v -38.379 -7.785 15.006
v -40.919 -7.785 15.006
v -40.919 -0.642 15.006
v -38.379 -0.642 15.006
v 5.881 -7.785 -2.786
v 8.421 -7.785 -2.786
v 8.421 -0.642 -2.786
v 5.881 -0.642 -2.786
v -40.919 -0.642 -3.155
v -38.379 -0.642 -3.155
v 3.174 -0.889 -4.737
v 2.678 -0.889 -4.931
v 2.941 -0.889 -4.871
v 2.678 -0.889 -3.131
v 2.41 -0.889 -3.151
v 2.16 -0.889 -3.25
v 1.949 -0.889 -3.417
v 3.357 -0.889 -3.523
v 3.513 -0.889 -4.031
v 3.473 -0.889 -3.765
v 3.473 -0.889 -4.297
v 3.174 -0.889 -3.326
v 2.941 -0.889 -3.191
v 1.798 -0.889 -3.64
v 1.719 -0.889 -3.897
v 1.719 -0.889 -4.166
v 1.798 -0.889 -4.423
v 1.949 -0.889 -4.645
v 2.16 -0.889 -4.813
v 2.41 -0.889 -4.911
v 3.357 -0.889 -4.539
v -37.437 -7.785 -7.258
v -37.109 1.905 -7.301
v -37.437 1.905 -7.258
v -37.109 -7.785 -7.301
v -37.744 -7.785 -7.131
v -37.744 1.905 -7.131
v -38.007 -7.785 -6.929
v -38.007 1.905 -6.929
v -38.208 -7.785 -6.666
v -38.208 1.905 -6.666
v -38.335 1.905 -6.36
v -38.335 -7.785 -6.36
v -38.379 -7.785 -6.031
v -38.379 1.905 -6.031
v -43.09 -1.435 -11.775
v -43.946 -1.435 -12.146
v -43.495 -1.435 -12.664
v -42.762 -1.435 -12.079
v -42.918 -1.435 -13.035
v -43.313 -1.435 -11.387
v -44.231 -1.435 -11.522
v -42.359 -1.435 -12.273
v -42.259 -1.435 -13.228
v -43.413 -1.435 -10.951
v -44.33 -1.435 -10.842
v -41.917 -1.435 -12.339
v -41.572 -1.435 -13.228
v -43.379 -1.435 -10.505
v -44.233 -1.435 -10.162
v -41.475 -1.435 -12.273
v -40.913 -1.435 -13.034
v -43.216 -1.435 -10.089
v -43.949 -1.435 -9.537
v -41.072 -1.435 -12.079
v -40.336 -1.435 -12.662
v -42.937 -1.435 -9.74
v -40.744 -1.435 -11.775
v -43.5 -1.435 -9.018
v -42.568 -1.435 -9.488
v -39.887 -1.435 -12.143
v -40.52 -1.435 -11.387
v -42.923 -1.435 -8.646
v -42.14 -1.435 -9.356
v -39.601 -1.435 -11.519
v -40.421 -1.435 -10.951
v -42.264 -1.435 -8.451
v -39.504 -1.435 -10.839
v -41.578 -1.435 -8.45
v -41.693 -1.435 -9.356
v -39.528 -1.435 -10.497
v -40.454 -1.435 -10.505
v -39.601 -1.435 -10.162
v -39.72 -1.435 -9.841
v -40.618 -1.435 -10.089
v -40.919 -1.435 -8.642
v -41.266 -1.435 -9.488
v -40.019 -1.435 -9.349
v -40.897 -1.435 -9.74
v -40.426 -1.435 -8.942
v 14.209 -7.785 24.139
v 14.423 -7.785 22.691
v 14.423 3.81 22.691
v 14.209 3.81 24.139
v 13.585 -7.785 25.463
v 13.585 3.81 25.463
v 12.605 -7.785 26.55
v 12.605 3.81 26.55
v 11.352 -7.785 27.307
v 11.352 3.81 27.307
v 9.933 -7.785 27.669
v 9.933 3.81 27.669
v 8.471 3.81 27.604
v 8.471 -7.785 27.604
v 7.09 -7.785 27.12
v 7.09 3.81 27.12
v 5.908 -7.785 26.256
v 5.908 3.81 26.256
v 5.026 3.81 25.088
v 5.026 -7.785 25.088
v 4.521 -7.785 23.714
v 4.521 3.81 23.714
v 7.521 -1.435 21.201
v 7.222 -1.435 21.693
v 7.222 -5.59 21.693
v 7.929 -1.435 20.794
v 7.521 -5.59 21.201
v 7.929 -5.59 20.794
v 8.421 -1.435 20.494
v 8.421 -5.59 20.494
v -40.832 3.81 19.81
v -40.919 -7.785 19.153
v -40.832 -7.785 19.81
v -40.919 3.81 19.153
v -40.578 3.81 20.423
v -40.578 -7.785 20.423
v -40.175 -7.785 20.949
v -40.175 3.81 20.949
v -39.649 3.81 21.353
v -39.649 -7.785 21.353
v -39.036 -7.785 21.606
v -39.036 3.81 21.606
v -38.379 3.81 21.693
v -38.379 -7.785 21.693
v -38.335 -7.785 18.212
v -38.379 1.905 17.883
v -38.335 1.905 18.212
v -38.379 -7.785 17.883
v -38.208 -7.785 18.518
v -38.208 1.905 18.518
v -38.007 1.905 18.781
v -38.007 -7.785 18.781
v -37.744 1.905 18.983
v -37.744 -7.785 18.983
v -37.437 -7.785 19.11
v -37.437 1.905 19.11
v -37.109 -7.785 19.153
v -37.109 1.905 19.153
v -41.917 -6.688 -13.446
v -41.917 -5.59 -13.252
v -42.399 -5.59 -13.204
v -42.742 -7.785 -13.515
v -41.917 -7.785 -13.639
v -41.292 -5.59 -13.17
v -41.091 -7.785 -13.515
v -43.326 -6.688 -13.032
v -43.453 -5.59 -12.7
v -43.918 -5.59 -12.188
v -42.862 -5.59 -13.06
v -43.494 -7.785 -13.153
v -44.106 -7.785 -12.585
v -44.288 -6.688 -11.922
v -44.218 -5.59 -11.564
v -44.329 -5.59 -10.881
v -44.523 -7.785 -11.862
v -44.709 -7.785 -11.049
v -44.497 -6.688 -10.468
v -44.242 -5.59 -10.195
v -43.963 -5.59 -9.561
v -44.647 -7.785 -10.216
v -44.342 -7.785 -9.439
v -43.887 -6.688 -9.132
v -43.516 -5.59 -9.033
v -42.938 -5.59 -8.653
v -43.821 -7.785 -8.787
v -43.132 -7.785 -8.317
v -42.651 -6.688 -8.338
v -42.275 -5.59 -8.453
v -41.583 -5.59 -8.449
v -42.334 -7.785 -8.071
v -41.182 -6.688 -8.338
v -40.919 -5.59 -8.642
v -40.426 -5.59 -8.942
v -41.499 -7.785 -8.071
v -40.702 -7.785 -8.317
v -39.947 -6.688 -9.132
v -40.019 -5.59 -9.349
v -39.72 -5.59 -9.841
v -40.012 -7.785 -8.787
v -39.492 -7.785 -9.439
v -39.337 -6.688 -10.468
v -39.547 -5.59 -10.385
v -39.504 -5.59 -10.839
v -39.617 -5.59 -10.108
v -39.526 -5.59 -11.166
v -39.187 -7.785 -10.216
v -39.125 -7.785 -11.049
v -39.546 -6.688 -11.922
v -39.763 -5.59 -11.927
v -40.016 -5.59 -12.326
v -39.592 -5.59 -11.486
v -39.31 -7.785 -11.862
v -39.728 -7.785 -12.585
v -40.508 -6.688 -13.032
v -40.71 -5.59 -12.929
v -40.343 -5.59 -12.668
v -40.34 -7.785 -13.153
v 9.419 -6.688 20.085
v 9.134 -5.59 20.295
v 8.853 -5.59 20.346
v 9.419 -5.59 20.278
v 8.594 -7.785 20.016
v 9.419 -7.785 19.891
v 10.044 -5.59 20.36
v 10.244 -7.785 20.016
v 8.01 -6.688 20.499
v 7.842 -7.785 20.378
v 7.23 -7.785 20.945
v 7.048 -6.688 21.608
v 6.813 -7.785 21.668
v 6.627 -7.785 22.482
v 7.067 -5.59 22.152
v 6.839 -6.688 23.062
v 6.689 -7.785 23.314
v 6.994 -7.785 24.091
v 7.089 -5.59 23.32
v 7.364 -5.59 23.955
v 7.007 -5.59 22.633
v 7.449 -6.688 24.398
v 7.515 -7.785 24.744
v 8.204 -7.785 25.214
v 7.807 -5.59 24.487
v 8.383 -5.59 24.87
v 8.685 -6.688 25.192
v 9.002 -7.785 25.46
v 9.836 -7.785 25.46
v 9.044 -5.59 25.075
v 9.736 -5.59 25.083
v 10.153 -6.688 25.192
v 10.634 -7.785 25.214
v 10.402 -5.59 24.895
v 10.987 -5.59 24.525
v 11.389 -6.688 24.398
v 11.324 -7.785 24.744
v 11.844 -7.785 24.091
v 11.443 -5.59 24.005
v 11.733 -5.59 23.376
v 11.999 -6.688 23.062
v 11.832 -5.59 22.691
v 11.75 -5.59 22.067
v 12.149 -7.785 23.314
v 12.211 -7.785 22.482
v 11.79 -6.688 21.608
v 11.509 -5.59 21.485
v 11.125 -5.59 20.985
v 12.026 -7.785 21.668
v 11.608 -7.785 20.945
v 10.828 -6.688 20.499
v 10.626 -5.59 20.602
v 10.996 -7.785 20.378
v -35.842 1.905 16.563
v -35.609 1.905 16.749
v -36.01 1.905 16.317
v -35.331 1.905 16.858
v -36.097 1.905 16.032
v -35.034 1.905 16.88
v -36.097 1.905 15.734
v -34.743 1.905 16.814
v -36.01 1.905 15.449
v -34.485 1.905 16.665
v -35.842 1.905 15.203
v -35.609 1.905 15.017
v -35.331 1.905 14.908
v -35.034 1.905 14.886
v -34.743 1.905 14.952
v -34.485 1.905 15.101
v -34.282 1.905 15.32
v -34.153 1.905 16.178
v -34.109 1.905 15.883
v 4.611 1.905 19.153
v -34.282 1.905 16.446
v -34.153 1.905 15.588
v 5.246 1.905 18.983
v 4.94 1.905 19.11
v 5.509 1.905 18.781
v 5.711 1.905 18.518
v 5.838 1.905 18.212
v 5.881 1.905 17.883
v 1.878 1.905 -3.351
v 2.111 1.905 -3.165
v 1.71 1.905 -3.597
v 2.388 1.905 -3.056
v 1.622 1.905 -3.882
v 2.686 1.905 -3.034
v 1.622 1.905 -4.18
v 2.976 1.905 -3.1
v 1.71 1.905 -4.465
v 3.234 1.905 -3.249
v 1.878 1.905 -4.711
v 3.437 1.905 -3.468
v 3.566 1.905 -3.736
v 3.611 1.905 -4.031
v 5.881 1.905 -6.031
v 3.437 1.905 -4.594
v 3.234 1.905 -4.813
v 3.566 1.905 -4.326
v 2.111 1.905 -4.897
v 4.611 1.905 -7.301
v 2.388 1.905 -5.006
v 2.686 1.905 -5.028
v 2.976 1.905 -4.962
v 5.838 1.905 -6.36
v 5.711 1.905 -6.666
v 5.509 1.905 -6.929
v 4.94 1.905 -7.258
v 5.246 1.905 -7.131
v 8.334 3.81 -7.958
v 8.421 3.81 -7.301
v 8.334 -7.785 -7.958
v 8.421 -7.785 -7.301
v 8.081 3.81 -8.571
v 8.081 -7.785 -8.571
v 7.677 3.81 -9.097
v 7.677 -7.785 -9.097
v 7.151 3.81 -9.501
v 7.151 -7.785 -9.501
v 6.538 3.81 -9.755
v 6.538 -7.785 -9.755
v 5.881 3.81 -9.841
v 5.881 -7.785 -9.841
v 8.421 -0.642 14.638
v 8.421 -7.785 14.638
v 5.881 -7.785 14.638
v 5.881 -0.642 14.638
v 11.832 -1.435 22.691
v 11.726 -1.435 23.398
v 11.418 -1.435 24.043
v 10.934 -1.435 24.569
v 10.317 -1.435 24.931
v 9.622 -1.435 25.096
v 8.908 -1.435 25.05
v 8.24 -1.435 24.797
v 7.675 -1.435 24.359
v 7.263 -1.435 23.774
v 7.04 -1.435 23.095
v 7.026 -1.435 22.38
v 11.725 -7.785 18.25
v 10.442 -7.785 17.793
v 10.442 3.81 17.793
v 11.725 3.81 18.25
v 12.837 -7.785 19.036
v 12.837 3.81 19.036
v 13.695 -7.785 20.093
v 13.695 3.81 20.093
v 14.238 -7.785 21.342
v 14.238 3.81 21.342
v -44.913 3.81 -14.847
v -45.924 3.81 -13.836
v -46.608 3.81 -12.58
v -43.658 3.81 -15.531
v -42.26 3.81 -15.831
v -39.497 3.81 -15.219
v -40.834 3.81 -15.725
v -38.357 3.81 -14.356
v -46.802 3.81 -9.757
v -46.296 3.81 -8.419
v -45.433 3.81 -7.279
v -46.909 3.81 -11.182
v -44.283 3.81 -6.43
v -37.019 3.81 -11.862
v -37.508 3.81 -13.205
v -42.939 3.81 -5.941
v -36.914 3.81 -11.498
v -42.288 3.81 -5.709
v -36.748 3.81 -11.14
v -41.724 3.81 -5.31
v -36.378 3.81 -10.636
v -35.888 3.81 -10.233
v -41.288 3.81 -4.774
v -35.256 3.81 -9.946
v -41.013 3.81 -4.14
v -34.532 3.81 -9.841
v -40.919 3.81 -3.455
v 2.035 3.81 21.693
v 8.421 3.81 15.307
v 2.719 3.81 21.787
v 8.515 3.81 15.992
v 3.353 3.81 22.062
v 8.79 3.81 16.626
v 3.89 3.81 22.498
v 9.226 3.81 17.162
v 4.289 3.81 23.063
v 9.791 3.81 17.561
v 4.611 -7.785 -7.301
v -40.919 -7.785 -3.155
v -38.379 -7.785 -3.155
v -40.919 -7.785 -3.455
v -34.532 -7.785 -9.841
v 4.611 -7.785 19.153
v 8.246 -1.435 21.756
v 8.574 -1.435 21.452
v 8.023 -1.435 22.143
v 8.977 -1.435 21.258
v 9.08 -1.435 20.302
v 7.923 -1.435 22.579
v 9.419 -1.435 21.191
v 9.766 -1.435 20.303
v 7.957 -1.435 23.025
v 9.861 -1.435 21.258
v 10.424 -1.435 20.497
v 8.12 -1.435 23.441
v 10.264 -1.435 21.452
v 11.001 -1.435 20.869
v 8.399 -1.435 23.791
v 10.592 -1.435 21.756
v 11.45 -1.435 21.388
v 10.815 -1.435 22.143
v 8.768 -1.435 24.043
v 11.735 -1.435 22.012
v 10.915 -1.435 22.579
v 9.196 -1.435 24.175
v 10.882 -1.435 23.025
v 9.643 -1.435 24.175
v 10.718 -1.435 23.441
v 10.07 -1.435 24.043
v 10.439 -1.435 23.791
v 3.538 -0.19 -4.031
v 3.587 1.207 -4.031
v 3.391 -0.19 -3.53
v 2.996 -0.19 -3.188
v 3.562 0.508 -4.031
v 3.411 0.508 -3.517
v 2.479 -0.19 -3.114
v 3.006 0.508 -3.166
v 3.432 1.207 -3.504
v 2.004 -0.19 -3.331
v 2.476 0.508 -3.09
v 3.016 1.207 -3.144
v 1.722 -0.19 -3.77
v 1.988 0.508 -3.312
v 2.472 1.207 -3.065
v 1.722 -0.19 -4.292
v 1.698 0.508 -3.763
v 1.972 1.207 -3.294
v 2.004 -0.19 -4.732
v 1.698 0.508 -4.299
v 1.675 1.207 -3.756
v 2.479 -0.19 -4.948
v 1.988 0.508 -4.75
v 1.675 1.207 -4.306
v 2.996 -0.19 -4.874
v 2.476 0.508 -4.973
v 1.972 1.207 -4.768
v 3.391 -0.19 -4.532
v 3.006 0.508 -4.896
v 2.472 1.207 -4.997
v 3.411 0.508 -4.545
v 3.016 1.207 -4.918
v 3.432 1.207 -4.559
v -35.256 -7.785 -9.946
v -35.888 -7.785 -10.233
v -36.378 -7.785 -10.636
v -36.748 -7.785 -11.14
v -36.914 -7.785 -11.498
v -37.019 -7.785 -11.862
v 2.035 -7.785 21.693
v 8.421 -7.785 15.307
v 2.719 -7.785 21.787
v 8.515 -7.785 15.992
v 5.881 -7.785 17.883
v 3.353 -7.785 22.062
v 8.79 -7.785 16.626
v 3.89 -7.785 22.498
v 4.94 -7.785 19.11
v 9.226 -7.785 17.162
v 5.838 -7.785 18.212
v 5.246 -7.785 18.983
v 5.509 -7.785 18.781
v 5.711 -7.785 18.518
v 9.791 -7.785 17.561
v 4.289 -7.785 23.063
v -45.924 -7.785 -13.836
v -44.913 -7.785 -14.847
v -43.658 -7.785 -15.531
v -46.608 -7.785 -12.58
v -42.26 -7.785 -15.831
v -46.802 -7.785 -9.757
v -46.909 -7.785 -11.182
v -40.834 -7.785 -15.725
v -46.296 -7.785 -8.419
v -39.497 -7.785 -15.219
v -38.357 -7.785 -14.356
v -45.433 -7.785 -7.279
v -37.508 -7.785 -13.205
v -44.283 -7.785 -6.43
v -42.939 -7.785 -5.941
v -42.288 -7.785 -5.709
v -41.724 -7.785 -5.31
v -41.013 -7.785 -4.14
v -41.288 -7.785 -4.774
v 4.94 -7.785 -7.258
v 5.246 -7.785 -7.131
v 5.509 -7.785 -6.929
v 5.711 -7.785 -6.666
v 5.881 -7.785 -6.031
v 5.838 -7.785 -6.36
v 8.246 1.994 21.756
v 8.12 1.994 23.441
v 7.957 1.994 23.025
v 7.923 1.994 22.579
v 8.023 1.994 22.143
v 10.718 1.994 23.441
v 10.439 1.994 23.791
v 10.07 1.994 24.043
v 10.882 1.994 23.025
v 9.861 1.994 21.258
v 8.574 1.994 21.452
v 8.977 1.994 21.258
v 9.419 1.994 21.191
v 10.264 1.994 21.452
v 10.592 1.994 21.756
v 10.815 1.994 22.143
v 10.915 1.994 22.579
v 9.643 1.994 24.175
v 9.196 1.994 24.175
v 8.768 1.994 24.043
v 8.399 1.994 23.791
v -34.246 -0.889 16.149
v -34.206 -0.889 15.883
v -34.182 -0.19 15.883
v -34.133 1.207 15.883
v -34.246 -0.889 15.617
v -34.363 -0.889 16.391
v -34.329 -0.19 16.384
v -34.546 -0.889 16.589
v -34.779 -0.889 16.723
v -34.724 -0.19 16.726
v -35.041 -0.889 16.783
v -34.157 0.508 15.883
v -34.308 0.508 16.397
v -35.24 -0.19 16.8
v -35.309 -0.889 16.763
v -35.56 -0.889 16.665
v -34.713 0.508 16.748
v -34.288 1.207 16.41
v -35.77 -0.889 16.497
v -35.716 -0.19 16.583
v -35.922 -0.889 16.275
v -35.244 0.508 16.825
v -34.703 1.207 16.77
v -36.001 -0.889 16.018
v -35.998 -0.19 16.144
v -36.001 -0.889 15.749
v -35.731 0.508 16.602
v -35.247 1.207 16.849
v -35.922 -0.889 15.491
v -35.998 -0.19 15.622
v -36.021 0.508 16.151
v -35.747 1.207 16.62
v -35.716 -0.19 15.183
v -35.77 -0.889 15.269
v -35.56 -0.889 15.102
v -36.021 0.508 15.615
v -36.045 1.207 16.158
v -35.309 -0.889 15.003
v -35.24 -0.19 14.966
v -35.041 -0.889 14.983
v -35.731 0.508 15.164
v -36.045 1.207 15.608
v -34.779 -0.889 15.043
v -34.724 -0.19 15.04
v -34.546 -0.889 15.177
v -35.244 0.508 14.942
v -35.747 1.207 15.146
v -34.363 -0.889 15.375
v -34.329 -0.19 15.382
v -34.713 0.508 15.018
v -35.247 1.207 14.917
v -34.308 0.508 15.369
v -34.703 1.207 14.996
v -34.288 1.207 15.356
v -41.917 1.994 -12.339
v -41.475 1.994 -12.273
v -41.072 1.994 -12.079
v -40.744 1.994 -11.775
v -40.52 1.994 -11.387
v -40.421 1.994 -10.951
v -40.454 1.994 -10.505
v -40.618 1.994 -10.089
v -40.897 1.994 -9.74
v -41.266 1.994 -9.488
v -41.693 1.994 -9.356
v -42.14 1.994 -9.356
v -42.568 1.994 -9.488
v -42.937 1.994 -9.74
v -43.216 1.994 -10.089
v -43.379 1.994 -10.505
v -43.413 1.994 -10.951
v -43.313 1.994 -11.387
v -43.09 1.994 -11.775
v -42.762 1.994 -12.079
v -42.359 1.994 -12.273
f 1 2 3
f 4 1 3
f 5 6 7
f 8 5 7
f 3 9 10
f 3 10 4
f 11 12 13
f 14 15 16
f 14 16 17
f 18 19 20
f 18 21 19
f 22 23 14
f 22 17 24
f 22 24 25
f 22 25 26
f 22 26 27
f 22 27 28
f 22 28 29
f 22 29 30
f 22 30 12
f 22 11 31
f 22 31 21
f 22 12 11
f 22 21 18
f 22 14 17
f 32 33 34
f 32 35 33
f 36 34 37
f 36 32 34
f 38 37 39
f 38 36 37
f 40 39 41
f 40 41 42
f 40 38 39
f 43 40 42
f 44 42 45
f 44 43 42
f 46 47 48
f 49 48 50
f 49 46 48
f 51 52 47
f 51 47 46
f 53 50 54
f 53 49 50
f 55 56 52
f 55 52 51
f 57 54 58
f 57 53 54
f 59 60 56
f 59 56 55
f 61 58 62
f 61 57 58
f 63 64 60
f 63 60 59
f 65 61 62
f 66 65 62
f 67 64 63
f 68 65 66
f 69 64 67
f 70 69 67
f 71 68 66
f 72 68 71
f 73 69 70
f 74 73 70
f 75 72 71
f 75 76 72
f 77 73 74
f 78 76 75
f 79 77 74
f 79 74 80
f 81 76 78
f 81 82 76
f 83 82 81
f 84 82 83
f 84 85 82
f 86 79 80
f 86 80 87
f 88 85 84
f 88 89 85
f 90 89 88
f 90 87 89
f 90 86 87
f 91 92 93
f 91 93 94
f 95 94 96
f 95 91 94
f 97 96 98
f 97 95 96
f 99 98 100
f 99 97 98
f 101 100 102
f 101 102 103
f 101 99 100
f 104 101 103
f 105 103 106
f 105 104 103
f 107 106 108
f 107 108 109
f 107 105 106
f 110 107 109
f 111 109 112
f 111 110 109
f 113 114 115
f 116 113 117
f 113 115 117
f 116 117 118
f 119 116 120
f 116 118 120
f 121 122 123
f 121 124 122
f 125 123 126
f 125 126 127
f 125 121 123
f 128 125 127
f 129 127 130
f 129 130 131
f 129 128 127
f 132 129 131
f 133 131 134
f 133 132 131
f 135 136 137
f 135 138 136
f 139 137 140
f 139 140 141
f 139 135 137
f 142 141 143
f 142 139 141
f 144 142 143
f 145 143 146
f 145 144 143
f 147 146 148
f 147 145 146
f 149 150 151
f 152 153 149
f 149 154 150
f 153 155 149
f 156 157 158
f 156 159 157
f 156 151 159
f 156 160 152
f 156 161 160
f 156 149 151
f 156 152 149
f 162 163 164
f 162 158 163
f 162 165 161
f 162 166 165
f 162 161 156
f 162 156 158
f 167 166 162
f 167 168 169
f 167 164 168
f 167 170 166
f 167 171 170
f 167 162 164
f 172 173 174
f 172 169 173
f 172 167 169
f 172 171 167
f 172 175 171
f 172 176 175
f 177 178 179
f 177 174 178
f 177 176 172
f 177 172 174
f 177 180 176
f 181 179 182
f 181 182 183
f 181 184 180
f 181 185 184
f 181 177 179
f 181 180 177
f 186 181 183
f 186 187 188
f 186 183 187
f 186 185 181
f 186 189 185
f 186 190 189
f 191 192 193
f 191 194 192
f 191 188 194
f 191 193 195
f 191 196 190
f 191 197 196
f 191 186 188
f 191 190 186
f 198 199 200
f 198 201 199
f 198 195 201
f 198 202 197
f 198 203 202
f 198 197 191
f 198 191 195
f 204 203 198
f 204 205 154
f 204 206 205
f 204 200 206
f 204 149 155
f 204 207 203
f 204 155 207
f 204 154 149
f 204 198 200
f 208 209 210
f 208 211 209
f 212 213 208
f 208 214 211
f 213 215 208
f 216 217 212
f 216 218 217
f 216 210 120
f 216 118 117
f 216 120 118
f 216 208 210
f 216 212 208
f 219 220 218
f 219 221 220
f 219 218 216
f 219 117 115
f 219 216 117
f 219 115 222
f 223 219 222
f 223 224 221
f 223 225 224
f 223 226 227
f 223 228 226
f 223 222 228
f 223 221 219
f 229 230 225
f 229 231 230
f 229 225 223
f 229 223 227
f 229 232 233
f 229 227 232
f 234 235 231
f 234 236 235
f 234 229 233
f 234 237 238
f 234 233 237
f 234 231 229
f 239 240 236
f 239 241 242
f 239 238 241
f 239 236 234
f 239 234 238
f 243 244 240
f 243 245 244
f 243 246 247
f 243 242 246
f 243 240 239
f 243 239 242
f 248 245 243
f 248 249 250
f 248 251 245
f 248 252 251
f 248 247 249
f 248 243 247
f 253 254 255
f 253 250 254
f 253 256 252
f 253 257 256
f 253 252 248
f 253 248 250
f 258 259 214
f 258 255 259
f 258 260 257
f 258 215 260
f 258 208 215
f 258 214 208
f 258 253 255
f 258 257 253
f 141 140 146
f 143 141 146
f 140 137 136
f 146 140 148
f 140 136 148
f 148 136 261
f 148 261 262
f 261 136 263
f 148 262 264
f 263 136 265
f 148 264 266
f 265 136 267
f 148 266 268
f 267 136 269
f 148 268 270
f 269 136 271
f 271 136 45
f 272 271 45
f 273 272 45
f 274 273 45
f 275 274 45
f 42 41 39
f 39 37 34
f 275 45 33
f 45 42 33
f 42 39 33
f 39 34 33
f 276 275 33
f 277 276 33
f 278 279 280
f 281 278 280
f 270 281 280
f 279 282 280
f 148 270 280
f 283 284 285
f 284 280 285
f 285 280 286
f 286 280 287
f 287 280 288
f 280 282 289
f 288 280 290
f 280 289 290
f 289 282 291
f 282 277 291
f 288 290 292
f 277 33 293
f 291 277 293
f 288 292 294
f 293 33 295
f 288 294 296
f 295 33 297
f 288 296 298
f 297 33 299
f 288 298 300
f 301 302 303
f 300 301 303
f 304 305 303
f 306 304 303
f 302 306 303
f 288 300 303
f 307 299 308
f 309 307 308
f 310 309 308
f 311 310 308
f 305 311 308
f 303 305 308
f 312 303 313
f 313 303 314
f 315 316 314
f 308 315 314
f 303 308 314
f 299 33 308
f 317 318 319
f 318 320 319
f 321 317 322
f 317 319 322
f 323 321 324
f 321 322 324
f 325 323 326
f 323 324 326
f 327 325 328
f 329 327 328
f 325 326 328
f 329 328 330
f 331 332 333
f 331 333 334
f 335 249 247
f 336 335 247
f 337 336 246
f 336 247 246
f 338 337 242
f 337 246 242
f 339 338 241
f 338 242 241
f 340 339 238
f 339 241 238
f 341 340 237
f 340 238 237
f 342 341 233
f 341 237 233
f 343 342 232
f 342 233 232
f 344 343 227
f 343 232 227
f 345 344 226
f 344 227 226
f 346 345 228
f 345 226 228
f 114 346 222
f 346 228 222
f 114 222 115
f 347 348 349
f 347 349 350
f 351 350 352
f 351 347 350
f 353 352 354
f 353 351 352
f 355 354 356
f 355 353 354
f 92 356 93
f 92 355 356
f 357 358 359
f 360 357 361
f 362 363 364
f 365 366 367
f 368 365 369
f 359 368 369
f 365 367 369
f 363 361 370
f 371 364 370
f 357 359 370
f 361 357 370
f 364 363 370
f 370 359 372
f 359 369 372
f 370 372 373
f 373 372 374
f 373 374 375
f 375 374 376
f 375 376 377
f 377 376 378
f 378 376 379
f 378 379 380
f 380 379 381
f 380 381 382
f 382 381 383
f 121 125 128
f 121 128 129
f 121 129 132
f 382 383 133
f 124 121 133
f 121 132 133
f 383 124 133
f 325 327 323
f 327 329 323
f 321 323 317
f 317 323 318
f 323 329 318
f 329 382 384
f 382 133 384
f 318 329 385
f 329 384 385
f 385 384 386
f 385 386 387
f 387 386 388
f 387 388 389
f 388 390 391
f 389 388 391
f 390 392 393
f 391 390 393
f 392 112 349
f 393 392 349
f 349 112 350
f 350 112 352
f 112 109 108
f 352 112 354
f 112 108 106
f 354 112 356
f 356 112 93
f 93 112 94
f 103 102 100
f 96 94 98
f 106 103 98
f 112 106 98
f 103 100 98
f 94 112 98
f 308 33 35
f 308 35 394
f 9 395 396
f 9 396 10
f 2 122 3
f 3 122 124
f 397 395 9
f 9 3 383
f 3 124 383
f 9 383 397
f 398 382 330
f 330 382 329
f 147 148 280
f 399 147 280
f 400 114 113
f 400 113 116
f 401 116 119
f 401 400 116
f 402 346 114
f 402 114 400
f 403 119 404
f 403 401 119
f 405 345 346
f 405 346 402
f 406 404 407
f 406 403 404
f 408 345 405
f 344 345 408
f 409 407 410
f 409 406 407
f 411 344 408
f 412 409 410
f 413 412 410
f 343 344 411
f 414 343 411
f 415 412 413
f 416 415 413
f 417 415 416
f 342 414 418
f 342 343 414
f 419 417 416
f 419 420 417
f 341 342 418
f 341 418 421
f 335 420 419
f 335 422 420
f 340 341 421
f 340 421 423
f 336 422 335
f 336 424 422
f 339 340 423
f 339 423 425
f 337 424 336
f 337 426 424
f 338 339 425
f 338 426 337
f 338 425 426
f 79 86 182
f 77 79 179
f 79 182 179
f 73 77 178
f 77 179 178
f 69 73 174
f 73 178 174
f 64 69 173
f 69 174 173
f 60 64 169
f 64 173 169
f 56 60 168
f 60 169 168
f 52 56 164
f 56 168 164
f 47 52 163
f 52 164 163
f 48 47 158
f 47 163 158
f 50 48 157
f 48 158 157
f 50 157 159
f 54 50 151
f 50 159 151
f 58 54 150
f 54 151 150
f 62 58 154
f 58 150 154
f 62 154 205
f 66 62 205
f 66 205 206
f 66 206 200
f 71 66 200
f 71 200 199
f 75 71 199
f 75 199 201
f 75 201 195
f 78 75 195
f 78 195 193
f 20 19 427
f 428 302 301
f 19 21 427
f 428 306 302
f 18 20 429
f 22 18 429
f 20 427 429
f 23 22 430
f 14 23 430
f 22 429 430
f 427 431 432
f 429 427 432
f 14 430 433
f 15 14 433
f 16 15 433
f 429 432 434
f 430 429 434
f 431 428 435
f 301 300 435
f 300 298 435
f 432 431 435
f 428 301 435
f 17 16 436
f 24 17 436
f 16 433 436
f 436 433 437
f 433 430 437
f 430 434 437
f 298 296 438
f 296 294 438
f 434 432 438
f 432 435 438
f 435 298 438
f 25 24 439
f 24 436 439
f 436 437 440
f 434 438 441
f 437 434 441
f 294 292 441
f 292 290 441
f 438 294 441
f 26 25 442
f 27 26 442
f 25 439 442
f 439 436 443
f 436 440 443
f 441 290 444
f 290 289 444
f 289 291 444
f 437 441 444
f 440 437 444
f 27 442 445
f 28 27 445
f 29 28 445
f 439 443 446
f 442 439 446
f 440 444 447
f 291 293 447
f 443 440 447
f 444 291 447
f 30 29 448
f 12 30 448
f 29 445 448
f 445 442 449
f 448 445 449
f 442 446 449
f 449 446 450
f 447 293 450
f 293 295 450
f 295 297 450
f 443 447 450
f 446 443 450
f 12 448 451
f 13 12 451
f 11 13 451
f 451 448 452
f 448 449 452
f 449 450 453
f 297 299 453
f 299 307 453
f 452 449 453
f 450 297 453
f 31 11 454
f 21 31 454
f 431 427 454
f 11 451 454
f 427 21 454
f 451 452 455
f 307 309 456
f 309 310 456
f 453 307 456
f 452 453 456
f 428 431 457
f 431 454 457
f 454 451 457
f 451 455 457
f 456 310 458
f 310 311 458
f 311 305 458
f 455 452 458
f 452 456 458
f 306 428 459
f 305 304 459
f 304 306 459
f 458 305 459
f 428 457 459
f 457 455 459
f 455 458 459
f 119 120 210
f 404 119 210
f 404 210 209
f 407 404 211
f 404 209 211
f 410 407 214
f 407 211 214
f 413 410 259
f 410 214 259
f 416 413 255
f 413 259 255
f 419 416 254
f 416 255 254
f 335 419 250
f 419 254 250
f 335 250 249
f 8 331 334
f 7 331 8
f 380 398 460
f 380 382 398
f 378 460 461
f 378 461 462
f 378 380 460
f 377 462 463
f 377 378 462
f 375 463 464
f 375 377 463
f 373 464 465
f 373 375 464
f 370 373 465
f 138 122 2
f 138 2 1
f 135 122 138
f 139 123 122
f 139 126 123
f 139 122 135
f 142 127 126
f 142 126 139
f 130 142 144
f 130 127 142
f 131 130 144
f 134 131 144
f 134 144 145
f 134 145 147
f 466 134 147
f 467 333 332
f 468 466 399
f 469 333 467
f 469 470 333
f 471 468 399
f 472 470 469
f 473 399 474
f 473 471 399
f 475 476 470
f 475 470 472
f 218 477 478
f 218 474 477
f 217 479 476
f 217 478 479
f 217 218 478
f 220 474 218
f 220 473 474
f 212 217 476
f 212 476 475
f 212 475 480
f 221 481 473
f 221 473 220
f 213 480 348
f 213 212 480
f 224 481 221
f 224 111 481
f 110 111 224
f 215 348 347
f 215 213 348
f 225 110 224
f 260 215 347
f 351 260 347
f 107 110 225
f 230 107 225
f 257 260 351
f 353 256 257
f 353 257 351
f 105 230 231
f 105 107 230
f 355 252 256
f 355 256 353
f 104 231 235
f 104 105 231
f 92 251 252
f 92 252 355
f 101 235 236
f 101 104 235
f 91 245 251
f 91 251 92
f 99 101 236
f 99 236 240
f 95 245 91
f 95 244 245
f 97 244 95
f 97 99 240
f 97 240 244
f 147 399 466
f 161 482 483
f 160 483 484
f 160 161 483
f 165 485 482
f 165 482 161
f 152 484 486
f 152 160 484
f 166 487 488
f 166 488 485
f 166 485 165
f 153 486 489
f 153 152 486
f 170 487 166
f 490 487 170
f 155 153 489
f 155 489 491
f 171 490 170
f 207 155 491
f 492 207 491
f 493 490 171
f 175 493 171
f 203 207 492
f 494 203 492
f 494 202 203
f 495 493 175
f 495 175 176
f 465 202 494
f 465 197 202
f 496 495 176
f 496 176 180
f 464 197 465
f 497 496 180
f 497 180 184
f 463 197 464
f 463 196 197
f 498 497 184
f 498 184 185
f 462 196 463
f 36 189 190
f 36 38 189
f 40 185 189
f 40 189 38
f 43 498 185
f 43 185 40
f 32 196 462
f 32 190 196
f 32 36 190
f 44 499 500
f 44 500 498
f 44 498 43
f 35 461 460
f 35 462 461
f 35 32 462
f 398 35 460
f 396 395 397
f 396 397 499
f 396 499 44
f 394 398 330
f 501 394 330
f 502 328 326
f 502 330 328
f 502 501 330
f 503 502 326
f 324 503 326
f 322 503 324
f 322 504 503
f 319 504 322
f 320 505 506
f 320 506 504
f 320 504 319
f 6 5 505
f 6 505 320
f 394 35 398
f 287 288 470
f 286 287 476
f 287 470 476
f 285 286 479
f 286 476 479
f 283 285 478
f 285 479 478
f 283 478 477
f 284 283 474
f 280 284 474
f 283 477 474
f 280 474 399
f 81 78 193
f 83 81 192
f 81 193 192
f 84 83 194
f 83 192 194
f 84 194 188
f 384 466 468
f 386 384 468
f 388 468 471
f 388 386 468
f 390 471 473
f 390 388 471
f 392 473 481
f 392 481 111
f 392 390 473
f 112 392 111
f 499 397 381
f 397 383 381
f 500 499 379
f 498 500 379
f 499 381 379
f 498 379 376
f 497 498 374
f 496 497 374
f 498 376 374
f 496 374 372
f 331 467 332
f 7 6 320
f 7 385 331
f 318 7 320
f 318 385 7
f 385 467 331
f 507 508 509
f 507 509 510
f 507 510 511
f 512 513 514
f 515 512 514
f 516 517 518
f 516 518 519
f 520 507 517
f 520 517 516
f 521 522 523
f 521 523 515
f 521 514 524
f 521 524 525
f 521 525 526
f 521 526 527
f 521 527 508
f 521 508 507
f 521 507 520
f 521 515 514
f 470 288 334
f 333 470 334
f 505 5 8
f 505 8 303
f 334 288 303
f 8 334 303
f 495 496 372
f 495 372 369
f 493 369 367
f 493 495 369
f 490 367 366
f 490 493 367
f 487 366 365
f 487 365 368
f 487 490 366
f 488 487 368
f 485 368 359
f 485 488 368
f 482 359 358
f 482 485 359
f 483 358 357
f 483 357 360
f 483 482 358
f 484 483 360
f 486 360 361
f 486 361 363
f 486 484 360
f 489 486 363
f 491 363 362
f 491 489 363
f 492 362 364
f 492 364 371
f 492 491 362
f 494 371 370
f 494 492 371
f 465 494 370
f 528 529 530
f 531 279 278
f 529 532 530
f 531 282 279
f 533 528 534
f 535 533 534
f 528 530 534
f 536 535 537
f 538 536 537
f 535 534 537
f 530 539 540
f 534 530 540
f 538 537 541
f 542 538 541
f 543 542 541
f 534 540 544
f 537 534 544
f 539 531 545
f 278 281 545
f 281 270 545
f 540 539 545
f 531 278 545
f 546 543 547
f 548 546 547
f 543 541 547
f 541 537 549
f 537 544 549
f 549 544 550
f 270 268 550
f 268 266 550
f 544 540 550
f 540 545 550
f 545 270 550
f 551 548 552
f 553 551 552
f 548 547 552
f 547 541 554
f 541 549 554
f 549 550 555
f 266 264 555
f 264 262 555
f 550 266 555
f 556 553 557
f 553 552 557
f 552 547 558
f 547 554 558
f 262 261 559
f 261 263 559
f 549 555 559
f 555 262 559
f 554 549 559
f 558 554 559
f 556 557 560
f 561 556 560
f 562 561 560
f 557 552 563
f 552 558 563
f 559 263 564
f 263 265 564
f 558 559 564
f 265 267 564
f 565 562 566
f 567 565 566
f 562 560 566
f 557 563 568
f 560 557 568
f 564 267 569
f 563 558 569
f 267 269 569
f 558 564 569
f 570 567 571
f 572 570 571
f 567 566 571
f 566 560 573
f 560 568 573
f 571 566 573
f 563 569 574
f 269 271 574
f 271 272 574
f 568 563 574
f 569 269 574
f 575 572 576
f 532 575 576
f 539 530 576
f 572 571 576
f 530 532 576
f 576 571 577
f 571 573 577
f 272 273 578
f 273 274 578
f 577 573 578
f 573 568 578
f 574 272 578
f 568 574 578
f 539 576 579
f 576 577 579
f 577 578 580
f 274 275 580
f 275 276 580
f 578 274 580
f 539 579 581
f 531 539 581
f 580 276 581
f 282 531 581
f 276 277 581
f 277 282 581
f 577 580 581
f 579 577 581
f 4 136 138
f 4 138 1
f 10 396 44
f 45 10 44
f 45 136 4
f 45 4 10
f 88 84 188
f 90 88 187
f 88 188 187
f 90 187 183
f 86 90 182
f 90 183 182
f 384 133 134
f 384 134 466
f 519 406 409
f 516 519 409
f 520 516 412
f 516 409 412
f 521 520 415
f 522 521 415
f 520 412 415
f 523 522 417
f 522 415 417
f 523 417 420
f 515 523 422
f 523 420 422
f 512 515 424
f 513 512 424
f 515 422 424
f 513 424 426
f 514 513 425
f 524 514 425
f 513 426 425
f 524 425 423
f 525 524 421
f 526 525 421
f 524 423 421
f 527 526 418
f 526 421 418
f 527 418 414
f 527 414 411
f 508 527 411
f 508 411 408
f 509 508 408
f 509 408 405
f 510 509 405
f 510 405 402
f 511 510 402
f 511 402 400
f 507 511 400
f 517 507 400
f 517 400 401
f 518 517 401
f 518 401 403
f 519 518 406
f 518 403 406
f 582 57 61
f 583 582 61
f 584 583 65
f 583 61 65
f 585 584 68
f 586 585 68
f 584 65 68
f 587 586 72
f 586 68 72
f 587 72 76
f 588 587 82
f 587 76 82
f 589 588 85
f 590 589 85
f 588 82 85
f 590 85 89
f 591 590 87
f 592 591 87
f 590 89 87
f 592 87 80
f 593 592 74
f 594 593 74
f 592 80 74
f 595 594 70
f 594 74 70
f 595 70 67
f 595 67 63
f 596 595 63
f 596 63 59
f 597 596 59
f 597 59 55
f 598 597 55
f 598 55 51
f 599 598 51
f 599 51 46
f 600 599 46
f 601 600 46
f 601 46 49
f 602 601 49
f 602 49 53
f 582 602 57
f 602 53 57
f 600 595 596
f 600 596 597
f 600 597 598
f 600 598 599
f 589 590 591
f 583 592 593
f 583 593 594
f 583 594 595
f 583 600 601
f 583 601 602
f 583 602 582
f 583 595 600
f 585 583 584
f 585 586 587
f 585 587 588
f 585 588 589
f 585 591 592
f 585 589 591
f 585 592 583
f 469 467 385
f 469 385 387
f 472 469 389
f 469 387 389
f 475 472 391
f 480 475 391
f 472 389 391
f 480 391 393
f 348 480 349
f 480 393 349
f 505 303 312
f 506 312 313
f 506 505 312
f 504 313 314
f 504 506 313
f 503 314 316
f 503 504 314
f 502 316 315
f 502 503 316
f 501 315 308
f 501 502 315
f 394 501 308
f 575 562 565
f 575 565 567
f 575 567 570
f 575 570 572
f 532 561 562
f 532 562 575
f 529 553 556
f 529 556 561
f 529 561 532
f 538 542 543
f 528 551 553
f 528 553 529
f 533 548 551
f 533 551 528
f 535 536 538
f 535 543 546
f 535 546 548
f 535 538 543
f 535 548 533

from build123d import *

# Parameters (mm, degrees)
SKETCH2_W                     = 49.3395
SKETCH2_H                     = 31.5341
SKETCH2_W_2                   = 44.2595
SKETCH2_H_2                   = 26.4541
BOSS_EXTRUDE1_DEPTH           = 1.905
SKETCH2_3_W                   = 49.3395
SKETCH2_3_H                   = 31.5341
SKETCH2_3_W_2                 = 44.2595
SKETCH2_3_H_2                 = 26.4541
BOSS_EXTRUDE2_DEPTH           = 9.6901
BOSS_EXTRUDE4_DEPTH           = 11.5951
CUT_EXTRUDE1_DEPTH            = 6.35
SKETCH6_R                     = 1.5
CUT_EXTRUDE2_DEPTH            = 3.429
SKETCH9_R                     = 1
BOSS_EXTRUDE6_DEPTH           = 2.794
BOSS_EXTRUDE6_DRAFT           = 2
BOSS_EXTRUDE6_PROFILE_2_DEPTH = 2.794
BOSS_EXTRUDE6_PROFILE_2_DRAFT = 2
SKETCH10_W                    = 17.4244
SKETCH10_H                    = 7.142607
CUT_EXTRUDE3_DEPTH            = 2.54
SKETCH11_W                    = 18.161
SKETCH11_H                    = 7.142607
CUT_EXTRUDE4_DEPTH            = 2.54
FILLET1_R                     = 2.54
FILLET2_R                     = 1.27
FILLET3_R                     = 2.54


with BuildPart() as part:
    # Sketch2 → Boss-Extrude1 (new body)
    # profile 1 of 2: a face of its own
    with BuildSketch(Plane(origin=(-16.248832885, 1.905, 5.92599481), x_dir=(1, 0, 0), z_dir=(0, 1, 0))):
        Rectangle(SKETCH2_W, SKETCH2_H)
        Rectangle(SKETCH2_W_2, SKETCH2_H_2, mode=Mode.SUBTRACT)
    # profile 2 of 2: a face of its own
    with BuildSketch(Plane(origin=(-16.248832885, 1.905, 5.92599481), x_dir=(1, 0, 0), z_dir=(0, 1, 0))):
        Rectangle(SKETCH2_W_2, SKETCH2_H_2)
    extrude(amount=BOSS_EXTRUDE1_DEPTH)

    # Sketch2<3> → Boss-Extrude2 (add)
    with BuildSketch(Plane(origin=(-16.248832885, 1.905, 5.92599481), x_dir=(1, 0, 0), z_dir=(0, 1, 0))):
        Rectangle(SKETCH2_3_W, SKETCH2_3_H)
        Rectangle(SKETCH2_3_W_2, SKETCH2_3_H_2, mode=Mode.SUBTRACT)
    extrude(amount=-BOSS_EXTRUDE2_DEPTH)

    # Sketch4 → Boss-Extrude4 (add)
    with BuildSketch(Plane.XZ.offset(7.7851)):
        with BuildLine():
            Line((-40.918582885, -9.84105519), (-40.918582885, -8.642431999))
            ThreePointArc((-40.918582885, -8.642431999), (-43.945507331, -12.145771785), (-39.503803797, -10.839276102))
            ThreePointArc((-39.503803797, -10.839276102), (-39.558461814, -10.328598033), (-39.719959694, -9.84105519))
            Line((-39.719959694, -9.84105519), (-40.918582885, -9.84105519))
        make_face()
        with BuildLine():
            ThreePointArc((-39.719959694, -9.84105519), (-40.210555134, -9.133027439), (-40.918582885, -8.642431999))
            Line((-40.918582885, -8.642431999), (-40.918582885, -9.84105519))
            Line((-40.918582885, -9.84105519), (-39.719959694, -9.84105519))
        make_face()
        with BuildLine():
            Line((-40.918582885, -8.642431999), (-40.918582885, -5.936055787))
            ThreePointArc((-40.918582885, -5.936055787), (-45.791911037, -14.004960596), (-36.913003797, -10.839276102))
            ThreePointArc((-36.913003797, -10.839276102), (-36.938212217, -10.337638468), (-37.013583483, -9.84105519))
            Line((-37.013583483, -9.84105519), (-39.719959694, -9.84105519))
            ThreePointArc((-39.719959694, -9.84105519), (-39.558461814, -10.328598033), (-39.503803797, -10.839276102))
            ThreePointArc((-39.503803797, -10.839276102), (-43.945507331, -12.145771785), (-40.918582885, -8.642431999))
        make_face()
        with BuildLine():
            ThreePointArc((-37.013583483, -9.84105519), (-38.378582885, -7.30105519), (-40.918582885, -5.936055787))
            Line((-40.918582885, -5.936055787), (-40.918582885, -8.642431999))
            ThreePointArc((-40.918582885, -8.642431999), (-40.210555134, -9.133027439), (-39.719959694, -9.84105519))
            Line((-39.719959694, -9.84105519), (-37.013583483, -9.84105519))
        make_face()
        with BuildLine():
            Line((8.420917115, 21.69304481), (7.222293924, 21.69304481))
            ThreePointArc((7.222293924, 21.69304481), (7.712889363, 20.985017059), (8.420917115, 20.494421619))
            Line((8.420917115, 20.494421619), (8.420917115, 21.69304481))
        make_face()
        with BuildLine():
            ThreePointArc((11.832138026, 22.691265722), (8.908459957, 25.049607705), (7.222293924, 21.69304481))
            Line((7.222293924, 21.69304481), (8.420917115, 21.69304481))
            Line((8.420917115, 21.69304481), (8.420917115, 20.494421619))
            ThreePointArc((8.420917115, 20.494421619), (10.72563371, 20.662562188), (11.832138026, 22.691265722))
        make_face()
        with BuildLine():
            ThreePointArc((8.420917115, 17.788045407), (12.584822521, 18.816158482), (14.422938026, 22.691265722))
            ThreePointArc((14.422938026, 22.691265722), (8.917500393, 27.669857302), (4.515917712, 21.69304481))
            Line((4.515917712, 21.69304481), (7.222293924, 21.69304481))
            ThreePointArc((7.222293924, 21.69304481), (8.908459957, 25.049607705), (11.832138026, 22.691265722))
            ThreePointArc((11.832138026, 22.691265722), (10.72563371, 20.662562188), (8.420917115, 20.494421619))
            Line((8.420917115, 20.494421619), (8.420917115, 17.788045407))
        make_face()
        with BuildLine():
            Line((7.222293924, 21.69304481), (4.515917712, 21.69304481))
            ThreePointArc((4.515917712, 21.69304481), (5.880917115, 19.15304481), (8.420917115, 17.788045407))
            Line((8.420917115, 17.788045407), (8.420917115, 20.494421619))
            ThreePointArc((8.420917115, 20.494421619), (7.712889363, 20.985017059), (7.222293924, 21.69304481))
        make_face()
    extrude(amount=-BOSS_EXTRUDE4_DEPTH)

    # Sketch4<3> → Cut-Extrude1 (cut)
    with BuildSketch(Plane.XZ.offset(7.7851)):
        with BuildLine():
            Line((-40.918582885, -9.84105519), (-40.918582885, -8.642431999))
            ThreePointArc((-40.918582885, -8.642431999), (-43.945507331, -12.145771785), (-39.503803797, -10.839276102))
            ThreePointArc((-39.503803797, -10.839276102), (-39.558461814, -10.328598033), (-39.719959694, -9.84105519))
            Line((-39.719959694, -9.84105519), (-40.918582885, -9.84105519))
        make_face()
        with BuildLine():
            ThreePointArc((-39.719959694, -9.84105519), (-40.210555134, -9.133027439), (-40.918582885, -8.642431999))
            Line((-40.918582885, -8.642431999), (-40.918582885, -9.84105519))
            Line((-40.918582885, -9.84105519), (-39.719959694, -9.84105519))
        make_face()
        with BuildLine():
            Line((8.420917115, 21.69304481), (7.222293924, 21.69304481))
            ThreePointArc((7.222293924, 21.69304481), (7.712889363, 20.985017059), (8.420917115, 20.494421619))
            Line((8.420917115, 20.494421619), (8.420917115, 21.69304481))
        make_face()
        with BuildLine():
            ThreePointArc((11.832138026, 22.691265722), (8.908459957, 25.049607705), (7.222293924, 21.69304481))
            Line((7.222293924, 21.69304481), (8.420917115, 21.69304481))
            Line((8.420917115, 21.69304481), (8.420917115, 20.494421619))
            ThreePointArc((8.420917115, 20.494421619), (10.72563371, 20.662562188), (11.832138026, 22.691265722))
        make_face()
    extrude(amount=-CUT_EXTRUDE1_DEPTH, mode=Mode.SUBTRACT)

    # Sketch6 → Cut-Extrude2 (cut)
    with BuildSketch(Plane.XZ.offset(1.4351)):
        with Locations(Location((9.419138026, 22.691265722, 0), (0, 0, 270))):
            Circle(SKETCH6_R)
        with Locations(Location((-41.916803797, -10.839276102, 0), (0, 0, 270))):
            Circle(SKETCH6_R)
    extrude(amount=-CUT_EXTRUDE2_DEPTH, mode=Mode.SUBTRACT)

    # Sketch7 → Cut-Revolve1 (revolve, cut)
    with BuildSketch(Plane(origin=(0, 0, -10.839276102), x_dir=(0, -1, 0), z_dir=(0, 0, -1)), mode=Mode.PRIVATE) as cut_revolve1_sk:
        Polygon((1.4351, 43.597127469), (7.7851, 44.716803797), (7.7851, 41.916803797), (1.4351, 41.916803797), align=None)
    revolve(cut_revolve1_sk.sketch.rotate(Axis((-41.916803797, -7.7851, -10.839276102), (0, 1, 0)), 270), axis=Axis((-41.916803797, -7.7851, -10.839276102), (0, 1, 0)), mode=Mode.SUBTRACT)

    # Sketch8 → Cut-Revolve2 (revolve, cut)
    with BuildSketch(Plane(origin=(9.419138026, 0, 0), x_dir=(0, -1, 0), z_dir=(-1, 0, 0)), mode=Mode.PRIVATE) as cut_revolve2_sk:
        Polygon((1.4351, 24.371589394), (7.7851, 25.491265722), (7.7851, 22.691265722), (1.4351, 22.691265722), align=None)
    revolve(cut_revolve2_sk.sketch.rotate(Axis((9.419138026, -7.7851, 22.691265722), (0, 1, 0)), 180), axis=Axis((9.419138026, -7.7851, 22.691265722), (0, 1, 0)), mode=Mode.SUBTRACT)


with BuildPart() as boss_extrude6_tool:
    # Sketch9 → Boss-Extrude6 (with draft: the straight prism first)
    with BuildSketch(Plane.XZ.offset(-1.905)):
        with Locations((-35.108582885, 15.88304481)):
            Circle(SKETCH9_R)
    extrude(amount=BOSS_EXTRUDE6_DEPTH)
    # Boss-Extrude6: the draft: its side faces are tilted about the plane it starts from
    boss_extrude6_sides = [boss_extrude6_tool.faces().sort_by_distance(p)[0] for p in [
        (-36.108582885, 0.508, 15.88304481),
    ]]
    draft(boss_extrude6_sides, Plane.XZ.offset(-1.905), BOSS_EXTRUDE6_DRAFT)


with BuildPart() as part_1:
    add(part.part)

    # Boss-Extrude6: add boss_extrude6_tool
    add(boss_extrude6_tool.part)


with BuildPart() as boss_extrude6_profile_2_tool:
    # Sketch9 → Boss-Extrude6 profile 2 (with draft: the straight prism first)
    with BuildSketch(Plane.XZ.offset(-1.905)):
        with Locations((2.610917115, -4.03105519)):
            Circle(SKETCH9_R)
    extrude(amount=BOSS_EXTRUDE6_PROFILE_2_DEPTH)
    # Boss-Extrude6 profile 2: the draft: its side faces are tilted about the plane it starts from
    boss_extrude6_profile_2_sides = [boss_extrude6_profile_2_tool.faces().sort_by_distance(p)[0] for p in [
        (1.610917115, 0.508, -4.03105519),
    ]]
    draft(boss_extrude6_profile_2_sides, Plane.XZ.offset(-1.905), BOSS_EXTRUDE6_PROFILE_2_DRAFT)


with BuildPart() as part_2:
    add(part_1.part)

    # Boss-Extrude6 profile 2: add boss_extrude6_profile_2_tool
    add(boss_extrude6_profile_2_tool.part)

    # Sketch10 → Cut-Extrude3 (cut)
    with BuildSketch(Plane(origin=(8.420917115, 0, 0), x_dir=(0, 0, -1), z_dir=(1, 0, 0))):
        with Locations((-5.92599481, -4.2137965)):
            Rectangle(SKETCH10_W, SKETCH10_H)
    extrude(amount=-CUT_EXTRUDE3_DEPTH, mode=Mode.SUBTRACT)

    # Sketch11 → Cut-Extrude4 (cut)
    with BuildSketch(Plane.ZY.offset(40.918582885)):
        with Locations((5.92599481, -4.2137965)):
            Rectangle(SKETCH11_W, SKETCH11_H)
    extrude(amount=-CUT_EXTRUDE4_DEPTH, mode=Mode.SUBTRACT)

    # Fillet1
    fillet1_edges = [part_2.edges().sort_by_distance(p)[0] for p in [
        (-40.918582885, -1.98755, 21.69304481),
        (8.420917115, -1.98755, -9.84105519),
    ]]
    fillet(fillet1_edges, radius=FILLET1_R)

    # Fillet2
    fillet2_edges = [part_2.edges().sort_by_distance(p)[0] for p in [
        (-38.378582885, -2.94005, 19.15304481),
        (5.880917115, -2.94005, 19.15304481),
        (5.880917115, -2.94005, -7.30105519),
        (-38.378582885, -2.94005, -7.30105519),
    ]]
    fillet(fillet2_edges, radius=FILLET2_R)

    # Fillet3
    fillet3_edges = [part_2.edges().sort_by_distance(p)[0] for p in [
        (-37.013583483, -1.98755, -9.84105519),
        (-40.918582885, -1.98755, -5.936055787),
        (4.515917712, -1.98755, 21.69304481),
        (8.420917115, -1.98755, 17.788045407),
    ]]
    fillet(fillet3_edges, radius=FILLET3_R)


solid = part_2.part
